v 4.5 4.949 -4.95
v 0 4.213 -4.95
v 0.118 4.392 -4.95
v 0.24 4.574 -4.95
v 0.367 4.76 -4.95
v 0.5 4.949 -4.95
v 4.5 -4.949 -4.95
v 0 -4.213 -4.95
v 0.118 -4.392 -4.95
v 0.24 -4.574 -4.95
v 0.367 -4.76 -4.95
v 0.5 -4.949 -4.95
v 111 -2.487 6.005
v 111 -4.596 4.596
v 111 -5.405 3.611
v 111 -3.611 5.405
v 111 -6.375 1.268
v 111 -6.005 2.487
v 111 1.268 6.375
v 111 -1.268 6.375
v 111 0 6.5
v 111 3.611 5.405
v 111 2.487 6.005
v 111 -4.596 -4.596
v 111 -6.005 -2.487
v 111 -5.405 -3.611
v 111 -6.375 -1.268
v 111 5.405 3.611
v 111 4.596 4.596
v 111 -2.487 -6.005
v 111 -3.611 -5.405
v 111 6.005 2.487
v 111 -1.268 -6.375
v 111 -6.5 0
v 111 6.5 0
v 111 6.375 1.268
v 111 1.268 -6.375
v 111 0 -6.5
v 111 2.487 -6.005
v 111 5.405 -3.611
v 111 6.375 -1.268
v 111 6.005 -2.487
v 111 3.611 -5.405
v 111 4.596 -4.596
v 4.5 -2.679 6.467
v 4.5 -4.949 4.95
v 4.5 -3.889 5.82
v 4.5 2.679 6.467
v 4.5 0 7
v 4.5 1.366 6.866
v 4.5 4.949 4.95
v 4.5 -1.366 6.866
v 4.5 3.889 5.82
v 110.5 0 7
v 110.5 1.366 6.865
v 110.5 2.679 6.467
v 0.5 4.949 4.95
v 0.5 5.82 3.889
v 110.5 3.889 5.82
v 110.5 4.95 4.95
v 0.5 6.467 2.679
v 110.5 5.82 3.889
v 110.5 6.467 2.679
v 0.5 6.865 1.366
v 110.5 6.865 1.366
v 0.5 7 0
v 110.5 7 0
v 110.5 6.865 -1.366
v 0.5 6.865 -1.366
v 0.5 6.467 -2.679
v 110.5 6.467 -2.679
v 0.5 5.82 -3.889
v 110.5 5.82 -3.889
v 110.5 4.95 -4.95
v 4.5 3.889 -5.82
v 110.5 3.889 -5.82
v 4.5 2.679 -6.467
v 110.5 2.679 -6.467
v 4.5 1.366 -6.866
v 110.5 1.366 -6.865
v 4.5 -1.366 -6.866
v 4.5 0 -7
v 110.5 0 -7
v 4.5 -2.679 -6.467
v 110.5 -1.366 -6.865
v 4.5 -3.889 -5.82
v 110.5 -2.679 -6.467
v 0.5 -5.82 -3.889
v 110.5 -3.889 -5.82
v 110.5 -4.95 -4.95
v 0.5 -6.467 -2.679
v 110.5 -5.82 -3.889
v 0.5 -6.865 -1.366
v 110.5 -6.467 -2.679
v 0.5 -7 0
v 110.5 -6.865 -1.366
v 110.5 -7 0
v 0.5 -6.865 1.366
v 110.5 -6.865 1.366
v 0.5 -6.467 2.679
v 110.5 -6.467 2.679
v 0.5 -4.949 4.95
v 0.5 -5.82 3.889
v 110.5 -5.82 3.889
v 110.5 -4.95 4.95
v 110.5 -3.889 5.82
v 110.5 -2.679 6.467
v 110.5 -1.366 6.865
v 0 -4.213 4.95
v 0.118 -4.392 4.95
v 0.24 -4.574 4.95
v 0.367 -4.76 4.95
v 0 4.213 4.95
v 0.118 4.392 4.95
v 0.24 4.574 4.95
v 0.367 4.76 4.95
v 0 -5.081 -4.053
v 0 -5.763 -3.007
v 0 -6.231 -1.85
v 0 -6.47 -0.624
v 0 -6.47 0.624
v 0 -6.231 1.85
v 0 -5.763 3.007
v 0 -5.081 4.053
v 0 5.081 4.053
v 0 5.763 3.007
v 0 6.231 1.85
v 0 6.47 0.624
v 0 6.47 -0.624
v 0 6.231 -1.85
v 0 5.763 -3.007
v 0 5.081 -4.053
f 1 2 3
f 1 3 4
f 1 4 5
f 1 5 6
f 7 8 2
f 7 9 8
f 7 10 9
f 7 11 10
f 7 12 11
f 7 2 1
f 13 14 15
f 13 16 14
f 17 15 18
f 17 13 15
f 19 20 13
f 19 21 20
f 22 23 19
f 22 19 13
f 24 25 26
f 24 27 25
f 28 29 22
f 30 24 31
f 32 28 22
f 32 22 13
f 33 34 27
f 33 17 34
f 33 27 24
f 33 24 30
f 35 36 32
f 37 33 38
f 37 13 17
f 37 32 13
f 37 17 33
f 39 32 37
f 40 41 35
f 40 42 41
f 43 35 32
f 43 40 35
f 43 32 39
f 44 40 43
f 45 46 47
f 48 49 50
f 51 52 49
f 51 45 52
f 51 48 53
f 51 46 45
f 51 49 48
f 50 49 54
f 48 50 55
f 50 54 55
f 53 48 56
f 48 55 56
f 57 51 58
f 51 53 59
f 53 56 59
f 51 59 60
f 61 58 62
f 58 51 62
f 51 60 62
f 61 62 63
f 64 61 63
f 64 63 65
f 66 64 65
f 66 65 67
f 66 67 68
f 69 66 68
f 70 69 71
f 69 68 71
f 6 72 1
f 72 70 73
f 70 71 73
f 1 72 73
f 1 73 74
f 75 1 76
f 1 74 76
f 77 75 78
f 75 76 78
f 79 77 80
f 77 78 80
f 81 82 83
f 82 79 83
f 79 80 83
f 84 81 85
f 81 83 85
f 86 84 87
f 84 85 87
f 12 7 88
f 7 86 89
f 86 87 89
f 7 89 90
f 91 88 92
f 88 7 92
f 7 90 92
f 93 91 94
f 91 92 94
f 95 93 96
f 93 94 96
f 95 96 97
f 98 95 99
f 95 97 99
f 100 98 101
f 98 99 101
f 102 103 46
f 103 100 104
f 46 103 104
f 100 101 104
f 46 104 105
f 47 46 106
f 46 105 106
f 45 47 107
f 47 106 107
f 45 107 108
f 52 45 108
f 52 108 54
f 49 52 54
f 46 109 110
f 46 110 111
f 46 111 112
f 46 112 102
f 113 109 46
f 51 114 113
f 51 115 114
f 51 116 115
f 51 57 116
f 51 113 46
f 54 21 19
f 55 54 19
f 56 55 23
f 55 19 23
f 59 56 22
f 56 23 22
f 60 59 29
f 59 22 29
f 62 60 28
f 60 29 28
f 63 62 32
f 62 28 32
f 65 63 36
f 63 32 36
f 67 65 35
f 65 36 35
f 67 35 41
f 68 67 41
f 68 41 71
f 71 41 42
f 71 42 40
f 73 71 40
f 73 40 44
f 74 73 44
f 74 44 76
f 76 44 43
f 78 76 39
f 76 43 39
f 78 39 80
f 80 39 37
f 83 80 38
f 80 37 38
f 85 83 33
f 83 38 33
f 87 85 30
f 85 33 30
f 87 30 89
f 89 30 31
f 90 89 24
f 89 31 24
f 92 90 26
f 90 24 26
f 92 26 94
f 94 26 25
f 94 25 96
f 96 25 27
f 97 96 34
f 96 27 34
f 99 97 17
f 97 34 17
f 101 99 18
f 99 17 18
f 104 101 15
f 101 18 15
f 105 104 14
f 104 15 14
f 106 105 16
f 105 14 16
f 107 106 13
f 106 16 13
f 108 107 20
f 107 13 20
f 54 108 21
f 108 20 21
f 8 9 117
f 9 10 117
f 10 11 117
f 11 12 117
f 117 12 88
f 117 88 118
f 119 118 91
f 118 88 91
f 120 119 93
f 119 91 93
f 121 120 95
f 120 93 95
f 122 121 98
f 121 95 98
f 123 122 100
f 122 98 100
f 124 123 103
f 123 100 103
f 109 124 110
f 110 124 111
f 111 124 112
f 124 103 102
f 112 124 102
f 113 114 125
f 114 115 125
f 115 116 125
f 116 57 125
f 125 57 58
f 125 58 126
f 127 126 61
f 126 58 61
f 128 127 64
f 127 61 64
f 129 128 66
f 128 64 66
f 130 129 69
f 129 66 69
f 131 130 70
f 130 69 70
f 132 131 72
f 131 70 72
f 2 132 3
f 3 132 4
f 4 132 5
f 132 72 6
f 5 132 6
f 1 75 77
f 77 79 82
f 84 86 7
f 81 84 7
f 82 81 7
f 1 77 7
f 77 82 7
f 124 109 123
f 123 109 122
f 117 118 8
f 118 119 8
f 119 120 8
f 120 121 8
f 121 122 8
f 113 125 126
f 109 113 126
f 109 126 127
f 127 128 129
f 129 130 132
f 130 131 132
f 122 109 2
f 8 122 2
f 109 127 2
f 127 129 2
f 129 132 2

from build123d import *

# Parameters (mm, degrees)
F0_W     = 111
F0_H     = 7
F2_W     = 4.5
F2_H     = 2.05
F3_DEPTH = 12.5
F4_SIZE  = 0.5


with BuildPart() as f1:
    # F0 (on Front) → F1 (revolve)
    with BuildSketch(Plane.XZ):
        with Locations((55.5, 3.5)):
            Rectangle(F0_W, F0_H)
    revolve(axis=Axis((55.5, 0, 0), (-1, 0, 0)))

    # F2 (on Front) → F3 (cut, symmetric)
    with BuildSketch(Plane.XZ):
        with Locations((2.25, 5.975)):
            Rectangle(F2_W, F2_H)
        with Locations((2.25, -5.975)):
            Rectangle(F2_W, F2_H)
    extrude(amount=F3_DEPTH, both=True, mode=Mode.SUBTRACT)

    # F4
    f4_edges = [f1.edges().sort_by_distance(p)[0] for p in [
        (0, -7, 0),
        (0, 7, 0),
        (111, 0, -7),
    ]]
    chamfer(f4_edges, length=F4_SIZE)


solid = f1.part
